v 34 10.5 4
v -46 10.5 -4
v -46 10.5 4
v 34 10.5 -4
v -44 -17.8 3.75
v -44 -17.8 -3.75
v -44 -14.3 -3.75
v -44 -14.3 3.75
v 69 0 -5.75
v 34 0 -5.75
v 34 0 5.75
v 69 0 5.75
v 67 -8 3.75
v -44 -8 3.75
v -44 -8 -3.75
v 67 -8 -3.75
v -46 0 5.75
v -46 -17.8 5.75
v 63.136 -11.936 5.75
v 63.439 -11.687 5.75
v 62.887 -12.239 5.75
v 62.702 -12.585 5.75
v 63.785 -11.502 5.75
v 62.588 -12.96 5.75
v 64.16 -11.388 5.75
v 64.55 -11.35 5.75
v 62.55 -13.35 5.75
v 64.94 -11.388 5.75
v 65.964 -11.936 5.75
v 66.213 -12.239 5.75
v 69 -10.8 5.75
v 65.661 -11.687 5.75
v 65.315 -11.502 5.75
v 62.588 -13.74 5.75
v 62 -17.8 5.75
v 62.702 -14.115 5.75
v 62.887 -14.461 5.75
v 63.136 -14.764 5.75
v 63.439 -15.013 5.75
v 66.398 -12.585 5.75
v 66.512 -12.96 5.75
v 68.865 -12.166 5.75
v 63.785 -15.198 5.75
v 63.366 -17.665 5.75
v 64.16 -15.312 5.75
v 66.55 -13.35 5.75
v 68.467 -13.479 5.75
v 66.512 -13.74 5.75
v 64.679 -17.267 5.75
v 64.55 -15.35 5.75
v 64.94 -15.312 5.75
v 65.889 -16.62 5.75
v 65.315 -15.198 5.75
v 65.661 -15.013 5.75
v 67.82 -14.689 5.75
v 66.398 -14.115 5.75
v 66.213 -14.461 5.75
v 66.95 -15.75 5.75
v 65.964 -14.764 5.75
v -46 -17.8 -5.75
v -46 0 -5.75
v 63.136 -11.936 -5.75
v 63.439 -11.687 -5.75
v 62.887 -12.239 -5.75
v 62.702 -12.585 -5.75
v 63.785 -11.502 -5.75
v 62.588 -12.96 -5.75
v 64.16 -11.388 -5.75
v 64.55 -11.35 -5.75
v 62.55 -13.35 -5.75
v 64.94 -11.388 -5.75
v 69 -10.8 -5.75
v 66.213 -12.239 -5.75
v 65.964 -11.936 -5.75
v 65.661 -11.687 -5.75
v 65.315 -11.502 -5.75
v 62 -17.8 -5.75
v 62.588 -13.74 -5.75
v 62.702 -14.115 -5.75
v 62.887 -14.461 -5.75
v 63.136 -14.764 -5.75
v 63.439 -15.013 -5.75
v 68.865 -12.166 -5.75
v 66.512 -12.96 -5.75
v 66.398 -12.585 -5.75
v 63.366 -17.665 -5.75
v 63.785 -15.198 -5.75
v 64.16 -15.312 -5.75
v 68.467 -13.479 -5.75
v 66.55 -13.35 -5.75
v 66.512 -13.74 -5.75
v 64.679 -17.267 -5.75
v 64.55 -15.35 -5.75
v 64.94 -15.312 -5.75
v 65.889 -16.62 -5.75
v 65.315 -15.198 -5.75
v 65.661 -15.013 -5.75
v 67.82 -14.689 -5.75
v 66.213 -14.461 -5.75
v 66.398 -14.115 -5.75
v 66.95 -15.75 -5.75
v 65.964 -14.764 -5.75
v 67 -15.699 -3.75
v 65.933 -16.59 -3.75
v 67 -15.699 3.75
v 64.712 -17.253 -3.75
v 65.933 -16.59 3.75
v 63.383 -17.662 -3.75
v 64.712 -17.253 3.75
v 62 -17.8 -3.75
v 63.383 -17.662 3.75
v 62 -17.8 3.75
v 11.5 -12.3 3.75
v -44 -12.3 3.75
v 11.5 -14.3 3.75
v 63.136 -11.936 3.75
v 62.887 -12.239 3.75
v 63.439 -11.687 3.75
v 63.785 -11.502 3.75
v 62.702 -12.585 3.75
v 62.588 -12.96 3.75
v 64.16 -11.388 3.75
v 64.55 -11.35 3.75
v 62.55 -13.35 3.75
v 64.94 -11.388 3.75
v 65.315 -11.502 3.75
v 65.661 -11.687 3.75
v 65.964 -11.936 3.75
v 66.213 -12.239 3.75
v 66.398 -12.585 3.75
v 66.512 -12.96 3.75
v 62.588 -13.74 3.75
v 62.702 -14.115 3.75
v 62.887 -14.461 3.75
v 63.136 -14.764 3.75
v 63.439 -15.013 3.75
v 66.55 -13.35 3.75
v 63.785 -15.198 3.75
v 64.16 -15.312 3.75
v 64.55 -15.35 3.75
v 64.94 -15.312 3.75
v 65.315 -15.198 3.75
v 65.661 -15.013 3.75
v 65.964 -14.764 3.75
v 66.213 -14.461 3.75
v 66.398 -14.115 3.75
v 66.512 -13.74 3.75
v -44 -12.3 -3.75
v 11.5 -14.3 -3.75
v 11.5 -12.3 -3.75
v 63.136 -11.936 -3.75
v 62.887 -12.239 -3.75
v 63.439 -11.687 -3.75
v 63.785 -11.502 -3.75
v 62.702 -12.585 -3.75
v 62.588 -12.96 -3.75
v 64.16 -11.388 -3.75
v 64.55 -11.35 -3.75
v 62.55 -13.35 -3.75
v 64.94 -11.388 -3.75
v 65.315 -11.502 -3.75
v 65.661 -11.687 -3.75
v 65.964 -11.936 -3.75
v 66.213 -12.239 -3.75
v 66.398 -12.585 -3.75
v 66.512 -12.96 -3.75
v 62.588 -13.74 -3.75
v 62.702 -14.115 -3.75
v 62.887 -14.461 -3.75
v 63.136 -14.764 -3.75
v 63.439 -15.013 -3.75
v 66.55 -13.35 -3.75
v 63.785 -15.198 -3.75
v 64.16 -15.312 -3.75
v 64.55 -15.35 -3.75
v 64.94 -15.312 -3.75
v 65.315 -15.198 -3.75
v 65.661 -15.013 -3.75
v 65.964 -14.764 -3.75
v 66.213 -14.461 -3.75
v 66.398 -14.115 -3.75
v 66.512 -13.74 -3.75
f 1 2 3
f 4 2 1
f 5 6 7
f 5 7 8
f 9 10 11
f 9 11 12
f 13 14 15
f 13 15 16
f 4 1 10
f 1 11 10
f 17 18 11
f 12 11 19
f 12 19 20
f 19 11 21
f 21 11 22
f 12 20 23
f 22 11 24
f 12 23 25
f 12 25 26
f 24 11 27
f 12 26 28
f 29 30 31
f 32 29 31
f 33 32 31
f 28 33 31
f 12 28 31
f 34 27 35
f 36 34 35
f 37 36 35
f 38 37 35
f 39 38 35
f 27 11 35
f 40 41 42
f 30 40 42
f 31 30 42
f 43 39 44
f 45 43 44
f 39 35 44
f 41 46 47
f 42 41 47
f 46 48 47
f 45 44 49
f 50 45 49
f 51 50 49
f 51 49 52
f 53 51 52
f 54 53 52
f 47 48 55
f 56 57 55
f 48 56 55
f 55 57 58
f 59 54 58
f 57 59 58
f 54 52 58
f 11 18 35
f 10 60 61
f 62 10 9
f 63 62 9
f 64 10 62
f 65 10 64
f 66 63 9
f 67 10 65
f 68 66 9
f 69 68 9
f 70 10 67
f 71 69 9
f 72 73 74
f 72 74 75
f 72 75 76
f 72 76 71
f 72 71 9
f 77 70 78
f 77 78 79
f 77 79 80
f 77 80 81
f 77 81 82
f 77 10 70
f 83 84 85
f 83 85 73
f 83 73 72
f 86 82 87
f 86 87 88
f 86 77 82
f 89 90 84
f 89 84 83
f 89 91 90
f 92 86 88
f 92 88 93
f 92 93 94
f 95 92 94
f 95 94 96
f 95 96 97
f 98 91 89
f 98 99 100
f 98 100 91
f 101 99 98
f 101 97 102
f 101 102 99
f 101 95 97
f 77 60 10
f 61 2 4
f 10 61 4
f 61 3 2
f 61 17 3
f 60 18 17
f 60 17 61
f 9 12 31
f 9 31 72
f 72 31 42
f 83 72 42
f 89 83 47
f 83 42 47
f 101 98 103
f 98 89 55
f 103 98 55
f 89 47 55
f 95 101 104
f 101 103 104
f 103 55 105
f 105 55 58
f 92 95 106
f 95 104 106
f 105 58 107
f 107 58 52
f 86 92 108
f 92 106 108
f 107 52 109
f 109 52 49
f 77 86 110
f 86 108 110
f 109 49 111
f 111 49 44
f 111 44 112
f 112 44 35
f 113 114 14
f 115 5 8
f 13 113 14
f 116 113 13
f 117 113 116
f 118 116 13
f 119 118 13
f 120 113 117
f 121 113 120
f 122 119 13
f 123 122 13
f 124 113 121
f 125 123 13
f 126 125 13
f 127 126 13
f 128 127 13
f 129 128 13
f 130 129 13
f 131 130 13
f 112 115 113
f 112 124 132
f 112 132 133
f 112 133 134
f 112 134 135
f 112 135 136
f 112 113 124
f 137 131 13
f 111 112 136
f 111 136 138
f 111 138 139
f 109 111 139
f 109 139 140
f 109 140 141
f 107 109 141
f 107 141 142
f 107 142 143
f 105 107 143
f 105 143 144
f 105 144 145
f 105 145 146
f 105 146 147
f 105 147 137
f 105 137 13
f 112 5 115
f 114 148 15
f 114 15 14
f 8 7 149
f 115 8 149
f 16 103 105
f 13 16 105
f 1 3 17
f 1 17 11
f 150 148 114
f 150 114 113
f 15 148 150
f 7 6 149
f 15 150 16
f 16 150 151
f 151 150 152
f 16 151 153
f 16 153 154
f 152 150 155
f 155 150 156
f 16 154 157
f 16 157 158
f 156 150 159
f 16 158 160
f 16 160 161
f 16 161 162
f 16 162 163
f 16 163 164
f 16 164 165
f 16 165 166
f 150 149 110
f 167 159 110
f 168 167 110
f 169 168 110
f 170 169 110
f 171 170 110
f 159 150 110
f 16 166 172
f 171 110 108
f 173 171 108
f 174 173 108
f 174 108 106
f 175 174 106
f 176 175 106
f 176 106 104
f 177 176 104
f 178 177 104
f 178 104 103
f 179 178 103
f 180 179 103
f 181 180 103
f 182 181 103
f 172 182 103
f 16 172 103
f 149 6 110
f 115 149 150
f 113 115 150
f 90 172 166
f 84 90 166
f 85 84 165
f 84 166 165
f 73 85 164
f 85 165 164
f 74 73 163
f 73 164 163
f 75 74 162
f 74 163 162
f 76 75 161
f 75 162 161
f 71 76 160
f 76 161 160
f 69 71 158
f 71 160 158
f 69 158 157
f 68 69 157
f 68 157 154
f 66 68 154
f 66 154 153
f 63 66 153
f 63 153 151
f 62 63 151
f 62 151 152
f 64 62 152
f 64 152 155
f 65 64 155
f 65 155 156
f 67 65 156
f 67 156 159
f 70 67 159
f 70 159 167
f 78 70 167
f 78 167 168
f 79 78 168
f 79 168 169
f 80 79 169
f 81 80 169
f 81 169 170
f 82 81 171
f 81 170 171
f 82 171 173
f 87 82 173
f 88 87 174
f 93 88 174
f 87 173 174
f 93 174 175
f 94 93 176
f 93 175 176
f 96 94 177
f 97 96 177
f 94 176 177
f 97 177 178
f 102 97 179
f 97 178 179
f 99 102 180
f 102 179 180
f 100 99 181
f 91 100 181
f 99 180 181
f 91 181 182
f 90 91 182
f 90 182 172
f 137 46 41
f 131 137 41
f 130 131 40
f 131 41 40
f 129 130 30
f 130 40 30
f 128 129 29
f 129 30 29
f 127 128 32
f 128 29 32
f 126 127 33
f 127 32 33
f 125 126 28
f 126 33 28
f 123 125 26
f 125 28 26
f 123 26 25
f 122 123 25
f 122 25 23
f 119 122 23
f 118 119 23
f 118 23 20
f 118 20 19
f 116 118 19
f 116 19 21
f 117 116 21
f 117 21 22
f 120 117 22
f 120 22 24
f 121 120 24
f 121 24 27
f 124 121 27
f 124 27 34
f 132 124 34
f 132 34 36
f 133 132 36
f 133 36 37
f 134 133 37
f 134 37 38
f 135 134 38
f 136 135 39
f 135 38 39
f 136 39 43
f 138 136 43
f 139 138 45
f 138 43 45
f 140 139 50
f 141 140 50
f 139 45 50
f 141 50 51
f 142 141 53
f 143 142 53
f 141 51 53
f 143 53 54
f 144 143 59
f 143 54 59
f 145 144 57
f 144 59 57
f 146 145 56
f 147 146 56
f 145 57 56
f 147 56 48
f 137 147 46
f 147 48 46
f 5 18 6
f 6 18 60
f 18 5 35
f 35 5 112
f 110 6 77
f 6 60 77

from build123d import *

# Parameters (mm, degrees)
SKETCH1_W           = 138
SKETCH1_H           = 11.5
BOSS_EXTRUDE1_DEPTH = 17.8
SKETCH8_R           = 2
CUT_EXTRUDE4_DEPTH  = 11.5
SKETCH11_W          = 23
SKETCH11_H          = 11.5
CUT_EXTRUDE5_DEPTH  = 17.8
SKETCH14_W          = 80
SKETCH14_H          = 11.5
BOSS_EXTRUDE4_DEPTH = 10.5
CHAMFER1_SIZE       = 10.5
CHAMFER1_SIZE2      = 1.75
CHAMFER2_SIZE       = 10.5
CHAMFER2_SIZE2      = 1.75
SKETCH12_W          = 111
SKETCH12_H          = 7.5
CUT_EXTRUDE6_DEPTH  = 9.8
SKETCH13_W          = 55.5
SKETCH13_H          = 2
BOSS_EXTRUDE3_DEPTH = 7.5
FILLET1_R           = 7


with BuildPart() as part:
    # Sketch1 → Boss-Extrude1 (new body)
    with BuildSketch(Plane(origin=(0, 0, 0), x_dir=(1, 0, 0), z_dir=(0, 1, 0))):
        Rectangle(SKETCH1_W, SKETCH1_H)
    extrude(amount=-BOSS_EXTRUDE1_DEPTH)

    # Sketch8 → Cut-Extrude4 (cut)
    with BuildSketch(Plane.XY.offset(5.75)):
        with Locations((64.55, -13.35)):
            Circle(SKETCH8_R)
    extrude(amount=-CUT_EXTRUDE4_DEPTH, mode=Mode.SUBTRACT)

    # Sketch11 → Cut-Extrude5 (cut)
    with BuildSketch(Plane.XZ.offset(17.8)):
        with Locations((-57.5, 0)):
            Rectangle(SKETCH11_W, SKETCH11_H)
    extrude(amount=-CUT_EXTRUDE5_DEPTH, mode=Mode.SUBTRACT)

    # Sketch14 → Boss-Extrude4 (add)
    with BuildSketch(Plane(origin=(0, 0, 0), x_dir=(1, 0, 0), z_dir=(0, 1, 0))):
        with Locations((-6, 0)):
            Rectangle(SKETCH14_W, SKETCH14_H)
    extrude(amount=BOSS_EXTRUDE4_DEPTH)

    # Chamfer1
    chamfer1_edges = [part.edges().sort_by_distance(p)[0] for p in [
        (-6, 10.5, 5.75),
    ]]
    chamfer1_side = [part.faces().sort_by_distance(p)[0] for p in [
        (6.154026517, -4.745470138, 5.75),
    ]]
    chamfer(chamfer1_edges, length=CHAMFER1_SIZE, length2=CHAMFER1_SIZE2, reference=chamfer1_side[0])

    # Chamfer2
    chamfer2_edges = [part.edges().sort_by_distance(p)[0] for p in [
        (-6, 10.5, -5.75),
    ]]
    chamfer2_side = [part.faces().sort_by_distance(p)[0] for p in [
        (6.154026517, -4.745470138, -5.75),
    ]]
    chamfer(chamfer2_edges, length=CHAMFER2_SIZE, length2=CHAMFER2_SIZE2, reference=chamfer2_side[0])

    # Sketch12 → Cut-Extrude6 (cut)
    with BuildSketch(Plane.XZ.offset(17.8)):
        with Locations((11.5, 0)):
            Rectangle(SKETCH12_W, SKETCH12_H)
    extrude(amount=-CUT_EXTRUDE6_DEPTH, mode=Mode.SUBTRACT)

    # Sketch13 → Boss-Extrude3 (add)
    with BuildSketch(Plane.XY.offset(-3.75)):
        with Locations((-16.25, -13.3)):
            Rectangle(SKETCH13_W, SKETCH13_H)
    extrude(amount=BOSS_EXTRUDE3_DEPTH)

    # Fillet1
    # the kernel refuses this fillet: 7 mm, written as the material it takes off along each edge
    with BuildSketch(Plane(origin=(69, -17.8, 23.25), x_dir=(-1, 0, 0), z_dir=(0, 0, -1))) as fillet1_piece_1:
        with BuildLine():
            CenterArc((FILLET1_R, FILLET1_R), FILLET1_R, 180, 90)
            Line((0, FILLET1_R), (0, 0))
            Line((0, 0), (FILLET1_R, 0))
        make_face()
    extrude(amount=46.5, mode=Mode.SUBTRACT)


solid = part.part
